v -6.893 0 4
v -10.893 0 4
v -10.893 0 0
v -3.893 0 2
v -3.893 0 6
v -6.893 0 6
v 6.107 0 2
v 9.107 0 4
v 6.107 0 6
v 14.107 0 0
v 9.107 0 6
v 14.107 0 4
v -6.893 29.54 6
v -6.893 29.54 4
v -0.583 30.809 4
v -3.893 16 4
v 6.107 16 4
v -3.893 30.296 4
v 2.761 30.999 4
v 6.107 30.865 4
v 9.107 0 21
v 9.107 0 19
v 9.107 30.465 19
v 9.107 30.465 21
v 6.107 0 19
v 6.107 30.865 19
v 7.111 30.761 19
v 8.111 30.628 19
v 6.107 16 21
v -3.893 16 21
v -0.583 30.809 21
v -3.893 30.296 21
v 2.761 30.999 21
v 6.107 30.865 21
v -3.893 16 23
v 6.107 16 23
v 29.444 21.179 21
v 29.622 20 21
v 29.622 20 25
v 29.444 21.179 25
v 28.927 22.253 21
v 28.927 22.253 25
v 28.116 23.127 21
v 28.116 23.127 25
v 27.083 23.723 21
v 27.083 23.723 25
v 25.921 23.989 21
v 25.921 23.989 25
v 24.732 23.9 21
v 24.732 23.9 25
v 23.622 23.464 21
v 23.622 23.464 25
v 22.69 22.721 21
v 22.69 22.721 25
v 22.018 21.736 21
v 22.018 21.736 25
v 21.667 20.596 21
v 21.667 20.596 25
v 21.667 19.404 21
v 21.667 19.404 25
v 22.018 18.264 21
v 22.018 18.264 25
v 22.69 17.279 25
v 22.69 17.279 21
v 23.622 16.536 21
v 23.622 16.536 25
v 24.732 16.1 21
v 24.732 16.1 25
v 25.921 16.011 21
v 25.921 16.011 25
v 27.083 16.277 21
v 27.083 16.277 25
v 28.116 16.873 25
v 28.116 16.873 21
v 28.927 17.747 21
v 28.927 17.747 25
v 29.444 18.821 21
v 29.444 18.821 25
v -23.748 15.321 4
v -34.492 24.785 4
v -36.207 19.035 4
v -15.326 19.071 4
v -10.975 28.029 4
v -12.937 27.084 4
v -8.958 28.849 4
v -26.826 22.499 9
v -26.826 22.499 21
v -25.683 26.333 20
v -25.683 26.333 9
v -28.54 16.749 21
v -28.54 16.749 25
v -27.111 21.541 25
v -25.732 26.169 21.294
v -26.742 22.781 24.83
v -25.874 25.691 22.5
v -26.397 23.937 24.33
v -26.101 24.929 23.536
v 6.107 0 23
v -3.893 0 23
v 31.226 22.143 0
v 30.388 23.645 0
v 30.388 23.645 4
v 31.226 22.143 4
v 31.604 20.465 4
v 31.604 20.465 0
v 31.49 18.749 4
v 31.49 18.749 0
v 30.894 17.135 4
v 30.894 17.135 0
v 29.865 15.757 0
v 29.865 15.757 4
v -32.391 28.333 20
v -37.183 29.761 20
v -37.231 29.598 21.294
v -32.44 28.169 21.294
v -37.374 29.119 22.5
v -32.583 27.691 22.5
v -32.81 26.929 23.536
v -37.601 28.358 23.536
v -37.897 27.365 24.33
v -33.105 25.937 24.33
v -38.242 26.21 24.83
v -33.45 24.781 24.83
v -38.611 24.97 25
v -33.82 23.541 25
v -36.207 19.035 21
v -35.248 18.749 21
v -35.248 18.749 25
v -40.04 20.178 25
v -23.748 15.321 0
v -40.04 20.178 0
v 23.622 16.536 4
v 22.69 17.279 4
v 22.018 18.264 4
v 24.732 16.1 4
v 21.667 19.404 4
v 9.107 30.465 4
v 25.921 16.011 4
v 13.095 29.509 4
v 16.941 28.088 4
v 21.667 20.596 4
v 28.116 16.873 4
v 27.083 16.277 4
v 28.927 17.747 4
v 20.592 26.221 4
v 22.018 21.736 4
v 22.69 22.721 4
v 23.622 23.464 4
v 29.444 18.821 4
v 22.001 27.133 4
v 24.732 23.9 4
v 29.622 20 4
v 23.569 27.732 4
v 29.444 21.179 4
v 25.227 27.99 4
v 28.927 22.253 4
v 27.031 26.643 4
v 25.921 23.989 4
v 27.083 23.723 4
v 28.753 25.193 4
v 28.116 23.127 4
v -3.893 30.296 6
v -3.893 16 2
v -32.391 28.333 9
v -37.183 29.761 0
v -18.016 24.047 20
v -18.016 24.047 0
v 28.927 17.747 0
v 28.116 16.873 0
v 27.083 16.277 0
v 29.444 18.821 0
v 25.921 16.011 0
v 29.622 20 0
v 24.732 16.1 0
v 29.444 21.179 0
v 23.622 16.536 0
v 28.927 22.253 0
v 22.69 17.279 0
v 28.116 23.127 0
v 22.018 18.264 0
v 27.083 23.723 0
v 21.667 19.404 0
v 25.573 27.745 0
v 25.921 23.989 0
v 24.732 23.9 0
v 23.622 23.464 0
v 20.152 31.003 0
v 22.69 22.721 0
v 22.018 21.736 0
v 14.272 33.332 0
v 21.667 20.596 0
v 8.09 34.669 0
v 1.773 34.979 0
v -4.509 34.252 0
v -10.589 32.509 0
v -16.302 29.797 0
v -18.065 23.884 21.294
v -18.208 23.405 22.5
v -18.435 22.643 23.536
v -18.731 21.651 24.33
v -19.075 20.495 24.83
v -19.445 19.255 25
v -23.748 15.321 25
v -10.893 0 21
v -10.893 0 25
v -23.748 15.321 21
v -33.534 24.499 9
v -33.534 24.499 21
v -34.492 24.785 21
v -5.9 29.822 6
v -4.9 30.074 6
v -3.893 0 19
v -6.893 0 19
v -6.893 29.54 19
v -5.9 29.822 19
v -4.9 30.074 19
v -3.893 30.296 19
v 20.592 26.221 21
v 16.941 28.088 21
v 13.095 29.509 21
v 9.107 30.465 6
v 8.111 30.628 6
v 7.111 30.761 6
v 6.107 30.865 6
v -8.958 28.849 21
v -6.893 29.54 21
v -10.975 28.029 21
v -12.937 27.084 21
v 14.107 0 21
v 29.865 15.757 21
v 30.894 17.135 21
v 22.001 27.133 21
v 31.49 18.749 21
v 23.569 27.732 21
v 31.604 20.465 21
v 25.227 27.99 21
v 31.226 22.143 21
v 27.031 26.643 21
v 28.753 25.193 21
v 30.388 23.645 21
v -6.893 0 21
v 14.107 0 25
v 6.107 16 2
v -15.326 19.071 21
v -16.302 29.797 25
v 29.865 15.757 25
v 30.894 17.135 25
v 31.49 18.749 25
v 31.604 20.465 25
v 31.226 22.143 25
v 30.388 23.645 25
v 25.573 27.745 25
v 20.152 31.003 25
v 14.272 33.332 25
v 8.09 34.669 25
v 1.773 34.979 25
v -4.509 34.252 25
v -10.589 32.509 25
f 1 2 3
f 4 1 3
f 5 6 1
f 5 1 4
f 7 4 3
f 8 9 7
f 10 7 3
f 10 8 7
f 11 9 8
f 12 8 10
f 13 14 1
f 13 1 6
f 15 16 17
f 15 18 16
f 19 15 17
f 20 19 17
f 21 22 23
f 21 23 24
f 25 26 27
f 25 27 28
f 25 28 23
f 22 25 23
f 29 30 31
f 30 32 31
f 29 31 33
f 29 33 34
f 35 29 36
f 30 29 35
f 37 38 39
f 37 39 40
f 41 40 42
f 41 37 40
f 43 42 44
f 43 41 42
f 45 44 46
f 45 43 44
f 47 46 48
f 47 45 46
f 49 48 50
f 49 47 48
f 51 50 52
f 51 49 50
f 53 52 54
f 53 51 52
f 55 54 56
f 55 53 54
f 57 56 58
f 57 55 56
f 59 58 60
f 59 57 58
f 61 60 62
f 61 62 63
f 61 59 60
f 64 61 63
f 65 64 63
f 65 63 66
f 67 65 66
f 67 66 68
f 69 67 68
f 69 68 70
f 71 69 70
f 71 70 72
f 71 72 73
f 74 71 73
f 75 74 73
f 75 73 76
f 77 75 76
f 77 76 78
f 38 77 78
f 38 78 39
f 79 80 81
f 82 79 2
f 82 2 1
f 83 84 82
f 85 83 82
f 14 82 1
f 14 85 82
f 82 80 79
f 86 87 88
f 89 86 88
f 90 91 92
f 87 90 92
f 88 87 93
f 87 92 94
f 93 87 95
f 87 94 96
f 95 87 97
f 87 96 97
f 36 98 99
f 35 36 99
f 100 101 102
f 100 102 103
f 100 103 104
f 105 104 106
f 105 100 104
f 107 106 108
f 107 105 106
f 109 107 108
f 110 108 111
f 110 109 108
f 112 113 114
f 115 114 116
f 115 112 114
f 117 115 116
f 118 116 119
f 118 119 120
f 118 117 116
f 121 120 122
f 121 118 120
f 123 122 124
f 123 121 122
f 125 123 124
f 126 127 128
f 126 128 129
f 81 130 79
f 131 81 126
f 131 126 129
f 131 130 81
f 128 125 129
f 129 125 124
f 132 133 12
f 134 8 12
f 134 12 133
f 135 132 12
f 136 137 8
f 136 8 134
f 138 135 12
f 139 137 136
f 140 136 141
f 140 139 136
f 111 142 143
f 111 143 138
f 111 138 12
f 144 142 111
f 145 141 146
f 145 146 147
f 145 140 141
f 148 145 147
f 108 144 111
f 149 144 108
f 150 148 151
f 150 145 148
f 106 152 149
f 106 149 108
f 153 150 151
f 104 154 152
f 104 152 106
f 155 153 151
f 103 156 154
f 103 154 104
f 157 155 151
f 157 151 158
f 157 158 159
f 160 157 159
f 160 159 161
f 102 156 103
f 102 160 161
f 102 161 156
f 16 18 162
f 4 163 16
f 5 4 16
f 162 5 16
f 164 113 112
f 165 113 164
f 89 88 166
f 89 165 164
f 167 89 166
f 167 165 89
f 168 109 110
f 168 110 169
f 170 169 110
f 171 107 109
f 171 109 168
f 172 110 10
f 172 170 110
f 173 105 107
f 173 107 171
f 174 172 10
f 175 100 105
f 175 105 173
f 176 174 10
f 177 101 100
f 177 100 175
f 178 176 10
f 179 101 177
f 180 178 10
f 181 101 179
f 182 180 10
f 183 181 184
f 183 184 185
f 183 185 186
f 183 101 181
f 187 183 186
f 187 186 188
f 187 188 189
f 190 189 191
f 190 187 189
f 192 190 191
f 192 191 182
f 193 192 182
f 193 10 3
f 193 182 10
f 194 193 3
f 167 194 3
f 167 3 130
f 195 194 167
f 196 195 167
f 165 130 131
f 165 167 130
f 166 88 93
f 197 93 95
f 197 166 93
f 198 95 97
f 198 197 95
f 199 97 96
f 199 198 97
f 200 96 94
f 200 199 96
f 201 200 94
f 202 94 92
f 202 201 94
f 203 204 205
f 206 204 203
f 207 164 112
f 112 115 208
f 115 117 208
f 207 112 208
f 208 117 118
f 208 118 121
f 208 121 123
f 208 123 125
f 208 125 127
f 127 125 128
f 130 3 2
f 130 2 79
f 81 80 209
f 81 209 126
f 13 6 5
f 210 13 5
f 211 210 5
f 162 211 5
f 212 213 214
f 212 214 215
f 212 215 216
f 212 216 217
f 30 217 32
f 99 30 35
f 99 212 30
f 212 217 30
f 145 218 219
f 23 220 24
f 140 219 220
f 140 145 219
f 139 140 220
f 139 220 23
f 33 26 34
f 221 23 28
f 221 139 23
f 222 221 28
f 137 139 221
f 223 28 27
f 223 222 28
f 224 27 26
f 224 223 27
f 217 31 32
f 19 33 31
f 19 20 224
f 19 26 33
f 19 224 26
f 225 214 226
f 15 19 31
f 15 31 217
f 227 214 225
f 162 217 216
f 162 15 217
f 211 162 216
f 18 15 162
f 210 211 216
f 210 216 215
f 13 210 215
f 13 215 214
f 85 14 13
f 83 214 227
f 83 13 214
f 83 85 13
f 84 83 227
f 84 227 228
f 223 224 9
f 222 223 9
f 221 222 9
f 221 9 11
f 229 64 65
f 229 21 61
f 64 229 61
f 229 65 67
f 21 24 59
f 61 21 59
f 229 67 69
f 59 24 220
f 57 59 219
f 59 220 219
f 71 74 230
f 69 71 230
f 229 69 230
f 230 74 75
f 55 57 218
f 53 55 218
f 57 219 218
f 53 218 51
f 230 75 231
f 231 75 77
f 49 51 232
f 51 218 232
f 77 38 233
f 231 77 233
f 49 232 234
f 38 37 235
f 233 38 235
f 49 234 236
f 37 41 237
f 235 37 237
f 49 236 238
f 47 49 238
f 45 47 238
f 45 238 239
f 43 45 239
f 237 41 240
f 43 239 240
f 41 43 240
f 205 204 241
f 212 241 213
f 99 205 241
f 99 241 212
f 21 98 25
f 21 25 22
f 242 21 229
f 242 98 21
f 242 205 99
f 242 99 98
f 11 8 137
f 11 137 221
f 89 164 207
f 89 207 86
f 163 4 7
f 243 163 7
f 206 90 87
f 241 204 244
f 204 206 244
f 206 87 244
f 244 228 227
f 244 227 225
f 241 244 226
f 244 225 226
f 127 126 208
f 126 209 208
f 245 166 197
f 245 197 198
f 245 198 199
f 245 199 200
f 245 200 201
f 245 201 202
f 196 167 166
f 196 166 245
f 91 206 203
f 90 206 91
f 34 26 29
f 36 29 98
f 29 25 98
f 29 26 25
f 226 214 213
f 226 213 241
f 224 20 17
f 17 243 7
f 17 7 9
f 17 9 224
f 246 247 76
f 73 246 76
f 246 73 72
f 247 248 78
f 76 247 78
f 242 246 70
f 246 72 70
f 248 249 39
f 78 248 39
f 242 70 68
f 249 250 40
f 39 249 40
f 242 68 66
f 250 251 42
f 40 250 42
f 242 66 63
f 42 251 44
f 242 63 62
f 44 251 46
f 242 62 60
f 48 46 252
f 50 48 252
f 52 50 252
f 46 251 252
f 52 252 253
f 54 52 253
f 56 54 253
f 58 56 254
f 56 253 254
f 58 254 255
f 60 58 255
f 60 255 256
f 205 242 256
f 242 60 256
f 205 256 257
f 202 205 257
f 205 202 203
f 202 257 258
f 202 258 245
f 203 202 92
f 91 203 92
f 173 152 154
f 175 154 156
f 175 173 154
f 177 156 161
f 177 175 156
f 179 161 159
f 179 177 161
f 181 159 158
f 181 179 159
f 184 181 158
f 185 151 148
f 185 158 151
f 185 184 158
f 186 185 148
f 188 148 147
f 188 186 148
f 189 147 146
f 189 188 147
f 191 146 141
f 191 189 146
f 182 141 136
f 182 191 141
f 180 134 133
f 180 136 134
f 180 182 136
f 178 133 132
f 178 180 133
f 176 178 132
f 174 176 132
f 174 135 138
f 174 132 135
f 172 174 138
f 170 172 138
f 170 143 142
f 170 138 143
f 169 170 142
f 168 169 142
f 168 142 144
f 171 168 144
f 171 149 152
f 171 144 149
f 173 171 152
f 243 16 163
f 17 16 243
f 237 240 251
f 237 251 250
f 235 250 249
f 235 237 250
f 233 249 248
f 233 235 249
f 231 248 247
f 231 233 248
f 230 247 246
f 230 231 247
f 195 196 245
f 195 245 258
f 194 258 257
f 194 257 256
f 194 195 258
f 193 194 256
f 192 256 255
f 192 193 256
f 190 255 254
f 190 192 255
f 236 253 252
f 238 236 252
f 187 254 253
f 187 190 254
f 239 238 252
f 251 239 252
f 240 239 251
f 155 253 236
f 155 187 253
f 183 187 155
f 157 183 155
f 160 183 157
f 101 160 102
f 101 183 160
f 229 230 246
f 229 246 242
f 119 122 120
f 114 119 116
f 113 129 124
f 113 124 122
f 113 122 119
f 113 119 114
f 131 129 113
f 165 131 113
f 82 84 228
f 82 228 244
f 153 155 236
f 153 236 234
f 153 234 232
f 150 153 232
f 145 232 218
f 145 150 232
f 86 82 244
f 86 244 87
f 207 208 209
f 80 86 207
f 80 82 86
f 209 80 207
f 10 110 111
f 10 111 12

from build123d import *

# Parameters (mm, degrees)
SKETCH2_R                = 4
BOSS_EXTRUDE1_DEPTH      = 25
SHELL1_START             = 4
SHELL1_DEPTH             = 17
SKETCH4_W                = 10
SKETCH4_H                = 16
CUT_EXTRUDE1_DEPTH       = 2
SKETCH5_W                = 10
SKETCH5_H                = 16
CUT_EXTRUDE2_DEPTH       = 2
BOSS_EXTRUDE2_REACH      = 60.764
BOSS_EXTRUDE2_END_RADIUS = 34.587437562
SKETCH12_W               = 3
SKETCH12_H               = 2
CUT_EXTRUDE3_DEPTH       = 16
FILLET1_R                = 5
SKETCH14_R               = 8
CUT_EXTRUDE4_DEPTH       = 17


# Read off the part's stored shape, not the designer's step: Shell1
with BuildPart() as part:
    # Sketch2 → Boss-Extrude1 (new body)
    with BuildSketch(Plane.XY):
        with BuildLine():
            ThreePointArc((-16.302119642, 29.796788513), (8.090433332, 34.669313021), (30.38825142, 23.64454798))
            ThreePointArc((30.38825142, 23.64454798), (31.608808708, 19.602540573), (29.864628369, 15.757359313))
            Line((29.864628369, 15.757359313), (14.107269056, 0))
            Line((14.107269056, 0), (-10.892730944, 0))
            Line((-10.892730944, 0), (-23.748483138, 15.320888862))
            Line((-23.748483138, 15.320888862), (-40.039838772, 20.178020896))
            Line((-40.039838772, 20.178020896), (-37.182702282, 29.761171269))
            Line((-37.182702282, 29.761171269), (-18.016401536, 24.046898289))
            Line((-18.016401536, 24.046898289), (-16.302119642, 29.796788513))
        make_face()
        with Locations((25.621987682, 20)):
            Circle(SKETCH2_R, mode=Mode.SUBTRACT)
    extrude(amount=BOSS_EXTRUDE1_DEPTH)

    # Shell1 outline → Shell1 (cut)
    with BuildSketch(Plane.XY.offset(SHELL1_START)):
        with BuildLine():
            ThreePointArc((20.592180868, 26.221016269), (3.939176513, 30.988554812), (-12.936984293, 27.083791792))
            Line((-12.936984293, 27.083791792), (-15.325995982, 19.070783543))
            Line((-15.325995982, 19.070783543), (-34.492296729, 24.785056524))
            Line((-34.492296729, 24.785056524), (-36.206578623, 19.0351663))
            Line((-36.206578623, 19.0351663), (-23.748483138, 15.320888862))
            Line((-23.748483138, 15.320888862), (-10.892730944, 0))
            Line((-10.892730944, 0), (14.107269056, 0))
            Line((14.107269056, 0), (26.122970982, 12.015701926))
            ThreePointArc((26.122970982, 12.015701926), (18.16710341, 17.097466537), (20.592180868, 26.221016269))
        make_face()
    extrude(amount=SHELL1_DEPTH, mode=Mode.SUBTRACT)

    # Sketch4 → Cut-Extrude1 (cut)
    with BuildSketch(Plane.XY.offset(4)):
        with Locations((1.107269056, 8)):
            Rectangle(SKETCH4_W, SKETCH4_H)
    extrude(amount=-CUT_EXTRUDE1_DEPTH, mode=Mode.SUBTRACT)

    # Sketch5 → Cut-Extrude2 (cut)
    with BuildSketch(Plane(origin=(0, 0, 21), x_dir=(-1, 0, 0), z_dir=(0, 0, -1))):
        with Locations((-1.107269056, 8)):
            Rectangle(SKETCH5_W, SKETCH5_H)
    extrude(amount=-CUT_EXTRUDE2_DEPTH, mode=Mode.SUBTRACT)

    # Boss-Extrude2: up to this cylinder (the profile starts inside it)
    boss_extrude2_end = Plane(origin=(3.049463937, -3.587437562, 12.5), z_dir=(0, 0, -1)) * Cylinder(BOSS_EXTRUDE2_END_RADIUS, 206.702875123, mode=Mode.PRIVATE)
    # Sketch12 → Boss-Extrude2 (add, up to the surface)
    with BuildSketch(Plane.XZ, mode=Mode.PRIVATE) as boss_extrude2_sk1:
        with Locations((-5.392730944, 20)):
            Rectangle(SKETCH12_W, SKETCH12_H)
    boss_extrude2_tool1 = extrude(boss_extrude2_sk1.sketch, amount=-BOSS_EXTRUDE2_REACH, mode=Mode.PRIVATE) & boss_extrude2_end
    add(boss_extrude2_tool1.solids().sort_by_distance((-5.392731, 0, 20))[0])
    # Sketch12 → Boss-Extrude2 (add, up to the surface)
    with BuildSketch(Plane.XZ, mode=Mode.PRIVATE) as boss_extrude2_sk2:
        with Locations((7.607269056, 20)):
            Rectangle(SKETCH12_W, SKETCH12_H)
    boss_extrude2_tool2 = extrude(boss_extrude2_sk2.sketch, amount=-BOSS_EXTRUDE2_REACH, mode=Mode.PRIVATE) & boss_extrude2_end
    add(boss_extrude2_tool2.solids().sort_by_distance((7.607269, 0, 20))[0])
    # Sketch12 → Boss-Extrude2 (add, up to the surface)
    with BuildSketch(Plane.XZ, mode=Mode.PRIVATE) as boss_extrude2_sk3:
        with Locations((-5.392730944, 5)):
            Rectangle(SKETCH12_W, SKETCH12_H)
    boss_extrude2_tool3 = extrude(boss_extrude2_sk3.sketch, amount=-BOSS_EXTRUDE2_REACH, mode=Mode.PRIVATE) & boss_extrude2_end
    add(boss_extrude2_tool3.solids().sort_by_distance((-5.392731, 0, 5))[0])
    # Sketch12 → Boss-Extrude2 (add, up to the surface)
    with BuildSketch(Plane.XZ, mode=Mode.PRIVATE) as boss_extrude2_sk4:
        with Locations((7.607269056, 5)):
            Rectangle(SKETCH12_W, SKETCH12_H)
    boss_extrude2_tool4 = extrude(boss_extrude2_sk4.sketch, amount=-BOSS_EXTRUDE2_REACH, mode=Mode.PRIVATE) & boss_extrude2_end
    add(boss_extrude2_tool4.solids().sort_by_distance((7.607269, 0, 5))[0])

    # Sketch13 → Cut-Extrude3 (cut)
    with BuildSketch(Plane.XY.offset(25)):
        Polygon((-32.391127096, 28.332603024), (-35.248263586, 18.749452651), (-28.540058324, 16.749457107), (-25.682921834, 26.332607481), align=None)
    extrude(amount=-CUT_EXTRUDE3_DEPTH, mode=Mode.SUBTRACT)

    # Fillet1
    fillet1_edges = [part.edges().sort_by_distance(p)[0] for p in [
        (-34.786914689, 29.046887146, 25),
        (-21.849661685, 25.189752885, 25),
    ]]
    fillet(fillet1_edges, radius=FILLET1_R)

    # Sketch14 → Cut-Extrude4 (cut)
    with BuildSketch(Plane.XY.offset(4)):
        with Locations((25.621987682, 20)):
            Circle(SKETCH14_R)
    extrude(amount=CUT_EXTRUDE4_DEPTH, mode=Mode.SUBTRACT)


solid = part.part
